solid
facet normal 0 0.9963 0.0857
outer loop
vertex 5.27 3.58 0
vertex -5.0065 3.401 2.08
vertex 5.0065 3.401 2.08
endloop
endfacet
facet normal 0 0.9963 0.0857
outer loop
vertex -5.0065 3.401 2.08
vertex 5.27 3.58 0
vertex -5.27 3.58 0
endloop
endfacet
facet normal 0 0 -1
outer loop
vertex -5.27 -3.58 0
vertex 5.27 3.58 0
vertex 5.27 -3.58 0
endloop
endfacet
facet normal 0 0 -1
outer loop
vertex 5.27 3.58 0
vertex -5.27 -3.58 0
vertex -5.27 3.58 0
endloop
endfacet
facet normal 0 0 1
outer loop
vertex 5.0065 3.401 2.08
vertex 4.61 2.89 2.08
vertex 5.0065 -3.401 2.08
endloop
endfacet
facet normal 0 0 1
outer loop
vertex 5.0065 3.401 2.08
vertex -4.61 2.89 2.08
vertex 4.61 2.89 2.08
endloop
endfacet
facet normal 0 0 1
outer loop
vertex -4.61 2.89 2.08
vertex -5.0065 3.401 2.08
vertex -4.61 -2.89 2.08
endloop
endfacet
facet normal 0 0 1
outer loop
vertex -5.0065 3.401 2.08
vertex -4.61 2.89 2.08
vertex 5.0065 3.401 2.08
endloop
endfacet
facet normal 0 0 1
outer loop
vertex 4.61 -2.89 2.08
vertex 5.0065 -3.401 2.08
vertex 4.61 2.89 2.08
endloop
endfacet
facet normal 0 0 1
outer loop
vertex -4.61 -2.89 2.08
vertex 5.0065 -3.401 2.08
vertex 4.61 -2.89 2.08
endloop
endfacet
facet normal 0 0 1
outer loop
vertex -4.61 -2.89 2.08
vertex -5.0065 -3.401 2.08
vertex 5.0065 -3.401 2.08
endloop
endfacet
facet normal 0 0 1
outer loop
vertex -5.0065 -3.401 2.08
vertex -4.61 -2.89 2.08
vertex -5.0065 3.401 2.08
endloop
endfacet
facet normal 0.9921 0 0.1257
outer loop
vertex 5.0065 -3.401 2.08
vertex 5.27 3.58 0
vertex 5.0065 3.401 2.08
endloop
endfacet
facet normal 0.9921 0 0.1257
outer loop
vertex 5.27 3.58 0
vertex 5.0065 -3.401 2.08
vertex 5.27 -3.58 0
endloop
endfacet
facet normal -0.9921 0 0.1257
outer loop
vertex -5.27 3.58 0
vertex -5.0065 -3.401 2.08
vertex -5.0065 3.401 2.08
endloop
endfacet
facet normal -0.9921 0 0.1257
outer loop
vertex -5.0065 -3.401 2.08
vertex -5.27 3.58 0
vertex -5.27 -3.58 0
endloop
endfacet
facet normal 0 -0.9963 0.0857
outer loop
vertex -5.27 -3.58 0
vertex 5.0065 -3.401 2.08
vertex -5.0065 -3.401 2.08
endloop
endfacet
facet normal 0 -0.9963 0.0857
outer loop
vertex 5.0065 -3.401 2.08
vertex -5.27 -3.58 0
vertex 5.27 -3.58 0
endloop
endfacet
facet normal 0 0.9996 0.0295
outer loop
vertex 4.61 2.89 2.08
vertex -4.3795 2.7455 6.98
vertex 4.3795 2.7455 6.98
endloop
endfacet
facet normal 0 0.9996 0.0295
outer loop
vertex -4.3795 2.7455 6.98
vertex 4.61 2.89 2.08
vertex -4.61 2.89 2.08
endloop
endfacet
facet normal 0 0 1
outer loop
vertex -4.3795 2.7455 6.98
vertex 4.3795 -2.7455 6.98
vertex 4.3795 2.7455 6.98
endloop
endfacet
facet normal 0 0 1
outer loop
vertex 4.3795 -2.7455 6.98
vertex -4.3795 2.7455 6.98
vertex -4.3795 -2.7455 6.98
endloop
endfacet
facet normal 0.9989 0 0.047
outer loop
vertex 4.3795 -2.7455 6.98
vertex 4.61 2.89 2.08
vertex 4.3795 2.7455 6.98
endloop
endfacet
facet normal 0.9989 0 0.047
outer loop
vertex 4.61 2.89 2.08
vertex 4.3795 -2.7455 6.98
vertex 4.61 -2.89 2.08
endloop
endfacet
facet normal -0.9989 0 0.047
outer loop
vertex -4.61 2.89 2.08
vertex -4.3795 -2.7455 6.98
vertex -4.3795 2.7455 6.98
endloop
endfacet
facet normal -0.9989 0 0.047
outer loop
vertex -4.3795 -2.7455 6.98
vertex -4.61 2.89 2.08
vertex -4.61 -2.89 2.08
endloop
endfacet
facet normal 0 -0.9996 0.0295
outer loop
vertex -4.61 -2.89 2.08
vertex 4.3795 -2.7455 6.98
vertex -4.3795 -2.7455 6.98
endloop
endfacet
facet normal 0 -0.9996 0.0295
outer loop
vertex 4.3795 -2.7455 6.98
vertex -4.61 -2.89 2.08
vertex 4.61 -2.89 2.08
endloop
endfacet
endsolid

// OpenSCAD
$fn=96;



// base (mm)
baseWidth=10.54;
baseHeight=7.16;
baseDepth=2.08;

module baseChunk() {
    // this is naturally a top-right
    linear_extrude(height=baseDepth, scale=0.95)
    square([baseWidth/2,baseHeight/2]);
}

module drawBase() {
    // top right
    baseChunk();
    // top left
    mirror([1,0,0]) baseChunk();
    // bottom right
    mirror([0,1,0]) baseChunk();
    // bottom left
    rotate([0,0,180]) baseChunk();
}

drawBase();

upperWidth=9.22;
upperHeight=5.78;
upperDepth=4.90;

module upperChunk() {
    translate([0,0,baseDepth])
    linear_extrude(height=upperDepth, scale=0.95)
    square([upperWidth/2,upperHeight/2]);
}

module drawUpper() {
    // top right
    upperChunk();
    // top left
    mirror([1,0,0]) upperChunk();
    // bottom right
    mirror([0,1,0]) upperChunk();
    // bottom left
    rotate([0,0,180]) upperChunk();
}

drawUpper();

/*radius=5;
rotate([0,90,0])
translate([-radius,0,0])
linear_extrude(20)
circle(radius);
*/
